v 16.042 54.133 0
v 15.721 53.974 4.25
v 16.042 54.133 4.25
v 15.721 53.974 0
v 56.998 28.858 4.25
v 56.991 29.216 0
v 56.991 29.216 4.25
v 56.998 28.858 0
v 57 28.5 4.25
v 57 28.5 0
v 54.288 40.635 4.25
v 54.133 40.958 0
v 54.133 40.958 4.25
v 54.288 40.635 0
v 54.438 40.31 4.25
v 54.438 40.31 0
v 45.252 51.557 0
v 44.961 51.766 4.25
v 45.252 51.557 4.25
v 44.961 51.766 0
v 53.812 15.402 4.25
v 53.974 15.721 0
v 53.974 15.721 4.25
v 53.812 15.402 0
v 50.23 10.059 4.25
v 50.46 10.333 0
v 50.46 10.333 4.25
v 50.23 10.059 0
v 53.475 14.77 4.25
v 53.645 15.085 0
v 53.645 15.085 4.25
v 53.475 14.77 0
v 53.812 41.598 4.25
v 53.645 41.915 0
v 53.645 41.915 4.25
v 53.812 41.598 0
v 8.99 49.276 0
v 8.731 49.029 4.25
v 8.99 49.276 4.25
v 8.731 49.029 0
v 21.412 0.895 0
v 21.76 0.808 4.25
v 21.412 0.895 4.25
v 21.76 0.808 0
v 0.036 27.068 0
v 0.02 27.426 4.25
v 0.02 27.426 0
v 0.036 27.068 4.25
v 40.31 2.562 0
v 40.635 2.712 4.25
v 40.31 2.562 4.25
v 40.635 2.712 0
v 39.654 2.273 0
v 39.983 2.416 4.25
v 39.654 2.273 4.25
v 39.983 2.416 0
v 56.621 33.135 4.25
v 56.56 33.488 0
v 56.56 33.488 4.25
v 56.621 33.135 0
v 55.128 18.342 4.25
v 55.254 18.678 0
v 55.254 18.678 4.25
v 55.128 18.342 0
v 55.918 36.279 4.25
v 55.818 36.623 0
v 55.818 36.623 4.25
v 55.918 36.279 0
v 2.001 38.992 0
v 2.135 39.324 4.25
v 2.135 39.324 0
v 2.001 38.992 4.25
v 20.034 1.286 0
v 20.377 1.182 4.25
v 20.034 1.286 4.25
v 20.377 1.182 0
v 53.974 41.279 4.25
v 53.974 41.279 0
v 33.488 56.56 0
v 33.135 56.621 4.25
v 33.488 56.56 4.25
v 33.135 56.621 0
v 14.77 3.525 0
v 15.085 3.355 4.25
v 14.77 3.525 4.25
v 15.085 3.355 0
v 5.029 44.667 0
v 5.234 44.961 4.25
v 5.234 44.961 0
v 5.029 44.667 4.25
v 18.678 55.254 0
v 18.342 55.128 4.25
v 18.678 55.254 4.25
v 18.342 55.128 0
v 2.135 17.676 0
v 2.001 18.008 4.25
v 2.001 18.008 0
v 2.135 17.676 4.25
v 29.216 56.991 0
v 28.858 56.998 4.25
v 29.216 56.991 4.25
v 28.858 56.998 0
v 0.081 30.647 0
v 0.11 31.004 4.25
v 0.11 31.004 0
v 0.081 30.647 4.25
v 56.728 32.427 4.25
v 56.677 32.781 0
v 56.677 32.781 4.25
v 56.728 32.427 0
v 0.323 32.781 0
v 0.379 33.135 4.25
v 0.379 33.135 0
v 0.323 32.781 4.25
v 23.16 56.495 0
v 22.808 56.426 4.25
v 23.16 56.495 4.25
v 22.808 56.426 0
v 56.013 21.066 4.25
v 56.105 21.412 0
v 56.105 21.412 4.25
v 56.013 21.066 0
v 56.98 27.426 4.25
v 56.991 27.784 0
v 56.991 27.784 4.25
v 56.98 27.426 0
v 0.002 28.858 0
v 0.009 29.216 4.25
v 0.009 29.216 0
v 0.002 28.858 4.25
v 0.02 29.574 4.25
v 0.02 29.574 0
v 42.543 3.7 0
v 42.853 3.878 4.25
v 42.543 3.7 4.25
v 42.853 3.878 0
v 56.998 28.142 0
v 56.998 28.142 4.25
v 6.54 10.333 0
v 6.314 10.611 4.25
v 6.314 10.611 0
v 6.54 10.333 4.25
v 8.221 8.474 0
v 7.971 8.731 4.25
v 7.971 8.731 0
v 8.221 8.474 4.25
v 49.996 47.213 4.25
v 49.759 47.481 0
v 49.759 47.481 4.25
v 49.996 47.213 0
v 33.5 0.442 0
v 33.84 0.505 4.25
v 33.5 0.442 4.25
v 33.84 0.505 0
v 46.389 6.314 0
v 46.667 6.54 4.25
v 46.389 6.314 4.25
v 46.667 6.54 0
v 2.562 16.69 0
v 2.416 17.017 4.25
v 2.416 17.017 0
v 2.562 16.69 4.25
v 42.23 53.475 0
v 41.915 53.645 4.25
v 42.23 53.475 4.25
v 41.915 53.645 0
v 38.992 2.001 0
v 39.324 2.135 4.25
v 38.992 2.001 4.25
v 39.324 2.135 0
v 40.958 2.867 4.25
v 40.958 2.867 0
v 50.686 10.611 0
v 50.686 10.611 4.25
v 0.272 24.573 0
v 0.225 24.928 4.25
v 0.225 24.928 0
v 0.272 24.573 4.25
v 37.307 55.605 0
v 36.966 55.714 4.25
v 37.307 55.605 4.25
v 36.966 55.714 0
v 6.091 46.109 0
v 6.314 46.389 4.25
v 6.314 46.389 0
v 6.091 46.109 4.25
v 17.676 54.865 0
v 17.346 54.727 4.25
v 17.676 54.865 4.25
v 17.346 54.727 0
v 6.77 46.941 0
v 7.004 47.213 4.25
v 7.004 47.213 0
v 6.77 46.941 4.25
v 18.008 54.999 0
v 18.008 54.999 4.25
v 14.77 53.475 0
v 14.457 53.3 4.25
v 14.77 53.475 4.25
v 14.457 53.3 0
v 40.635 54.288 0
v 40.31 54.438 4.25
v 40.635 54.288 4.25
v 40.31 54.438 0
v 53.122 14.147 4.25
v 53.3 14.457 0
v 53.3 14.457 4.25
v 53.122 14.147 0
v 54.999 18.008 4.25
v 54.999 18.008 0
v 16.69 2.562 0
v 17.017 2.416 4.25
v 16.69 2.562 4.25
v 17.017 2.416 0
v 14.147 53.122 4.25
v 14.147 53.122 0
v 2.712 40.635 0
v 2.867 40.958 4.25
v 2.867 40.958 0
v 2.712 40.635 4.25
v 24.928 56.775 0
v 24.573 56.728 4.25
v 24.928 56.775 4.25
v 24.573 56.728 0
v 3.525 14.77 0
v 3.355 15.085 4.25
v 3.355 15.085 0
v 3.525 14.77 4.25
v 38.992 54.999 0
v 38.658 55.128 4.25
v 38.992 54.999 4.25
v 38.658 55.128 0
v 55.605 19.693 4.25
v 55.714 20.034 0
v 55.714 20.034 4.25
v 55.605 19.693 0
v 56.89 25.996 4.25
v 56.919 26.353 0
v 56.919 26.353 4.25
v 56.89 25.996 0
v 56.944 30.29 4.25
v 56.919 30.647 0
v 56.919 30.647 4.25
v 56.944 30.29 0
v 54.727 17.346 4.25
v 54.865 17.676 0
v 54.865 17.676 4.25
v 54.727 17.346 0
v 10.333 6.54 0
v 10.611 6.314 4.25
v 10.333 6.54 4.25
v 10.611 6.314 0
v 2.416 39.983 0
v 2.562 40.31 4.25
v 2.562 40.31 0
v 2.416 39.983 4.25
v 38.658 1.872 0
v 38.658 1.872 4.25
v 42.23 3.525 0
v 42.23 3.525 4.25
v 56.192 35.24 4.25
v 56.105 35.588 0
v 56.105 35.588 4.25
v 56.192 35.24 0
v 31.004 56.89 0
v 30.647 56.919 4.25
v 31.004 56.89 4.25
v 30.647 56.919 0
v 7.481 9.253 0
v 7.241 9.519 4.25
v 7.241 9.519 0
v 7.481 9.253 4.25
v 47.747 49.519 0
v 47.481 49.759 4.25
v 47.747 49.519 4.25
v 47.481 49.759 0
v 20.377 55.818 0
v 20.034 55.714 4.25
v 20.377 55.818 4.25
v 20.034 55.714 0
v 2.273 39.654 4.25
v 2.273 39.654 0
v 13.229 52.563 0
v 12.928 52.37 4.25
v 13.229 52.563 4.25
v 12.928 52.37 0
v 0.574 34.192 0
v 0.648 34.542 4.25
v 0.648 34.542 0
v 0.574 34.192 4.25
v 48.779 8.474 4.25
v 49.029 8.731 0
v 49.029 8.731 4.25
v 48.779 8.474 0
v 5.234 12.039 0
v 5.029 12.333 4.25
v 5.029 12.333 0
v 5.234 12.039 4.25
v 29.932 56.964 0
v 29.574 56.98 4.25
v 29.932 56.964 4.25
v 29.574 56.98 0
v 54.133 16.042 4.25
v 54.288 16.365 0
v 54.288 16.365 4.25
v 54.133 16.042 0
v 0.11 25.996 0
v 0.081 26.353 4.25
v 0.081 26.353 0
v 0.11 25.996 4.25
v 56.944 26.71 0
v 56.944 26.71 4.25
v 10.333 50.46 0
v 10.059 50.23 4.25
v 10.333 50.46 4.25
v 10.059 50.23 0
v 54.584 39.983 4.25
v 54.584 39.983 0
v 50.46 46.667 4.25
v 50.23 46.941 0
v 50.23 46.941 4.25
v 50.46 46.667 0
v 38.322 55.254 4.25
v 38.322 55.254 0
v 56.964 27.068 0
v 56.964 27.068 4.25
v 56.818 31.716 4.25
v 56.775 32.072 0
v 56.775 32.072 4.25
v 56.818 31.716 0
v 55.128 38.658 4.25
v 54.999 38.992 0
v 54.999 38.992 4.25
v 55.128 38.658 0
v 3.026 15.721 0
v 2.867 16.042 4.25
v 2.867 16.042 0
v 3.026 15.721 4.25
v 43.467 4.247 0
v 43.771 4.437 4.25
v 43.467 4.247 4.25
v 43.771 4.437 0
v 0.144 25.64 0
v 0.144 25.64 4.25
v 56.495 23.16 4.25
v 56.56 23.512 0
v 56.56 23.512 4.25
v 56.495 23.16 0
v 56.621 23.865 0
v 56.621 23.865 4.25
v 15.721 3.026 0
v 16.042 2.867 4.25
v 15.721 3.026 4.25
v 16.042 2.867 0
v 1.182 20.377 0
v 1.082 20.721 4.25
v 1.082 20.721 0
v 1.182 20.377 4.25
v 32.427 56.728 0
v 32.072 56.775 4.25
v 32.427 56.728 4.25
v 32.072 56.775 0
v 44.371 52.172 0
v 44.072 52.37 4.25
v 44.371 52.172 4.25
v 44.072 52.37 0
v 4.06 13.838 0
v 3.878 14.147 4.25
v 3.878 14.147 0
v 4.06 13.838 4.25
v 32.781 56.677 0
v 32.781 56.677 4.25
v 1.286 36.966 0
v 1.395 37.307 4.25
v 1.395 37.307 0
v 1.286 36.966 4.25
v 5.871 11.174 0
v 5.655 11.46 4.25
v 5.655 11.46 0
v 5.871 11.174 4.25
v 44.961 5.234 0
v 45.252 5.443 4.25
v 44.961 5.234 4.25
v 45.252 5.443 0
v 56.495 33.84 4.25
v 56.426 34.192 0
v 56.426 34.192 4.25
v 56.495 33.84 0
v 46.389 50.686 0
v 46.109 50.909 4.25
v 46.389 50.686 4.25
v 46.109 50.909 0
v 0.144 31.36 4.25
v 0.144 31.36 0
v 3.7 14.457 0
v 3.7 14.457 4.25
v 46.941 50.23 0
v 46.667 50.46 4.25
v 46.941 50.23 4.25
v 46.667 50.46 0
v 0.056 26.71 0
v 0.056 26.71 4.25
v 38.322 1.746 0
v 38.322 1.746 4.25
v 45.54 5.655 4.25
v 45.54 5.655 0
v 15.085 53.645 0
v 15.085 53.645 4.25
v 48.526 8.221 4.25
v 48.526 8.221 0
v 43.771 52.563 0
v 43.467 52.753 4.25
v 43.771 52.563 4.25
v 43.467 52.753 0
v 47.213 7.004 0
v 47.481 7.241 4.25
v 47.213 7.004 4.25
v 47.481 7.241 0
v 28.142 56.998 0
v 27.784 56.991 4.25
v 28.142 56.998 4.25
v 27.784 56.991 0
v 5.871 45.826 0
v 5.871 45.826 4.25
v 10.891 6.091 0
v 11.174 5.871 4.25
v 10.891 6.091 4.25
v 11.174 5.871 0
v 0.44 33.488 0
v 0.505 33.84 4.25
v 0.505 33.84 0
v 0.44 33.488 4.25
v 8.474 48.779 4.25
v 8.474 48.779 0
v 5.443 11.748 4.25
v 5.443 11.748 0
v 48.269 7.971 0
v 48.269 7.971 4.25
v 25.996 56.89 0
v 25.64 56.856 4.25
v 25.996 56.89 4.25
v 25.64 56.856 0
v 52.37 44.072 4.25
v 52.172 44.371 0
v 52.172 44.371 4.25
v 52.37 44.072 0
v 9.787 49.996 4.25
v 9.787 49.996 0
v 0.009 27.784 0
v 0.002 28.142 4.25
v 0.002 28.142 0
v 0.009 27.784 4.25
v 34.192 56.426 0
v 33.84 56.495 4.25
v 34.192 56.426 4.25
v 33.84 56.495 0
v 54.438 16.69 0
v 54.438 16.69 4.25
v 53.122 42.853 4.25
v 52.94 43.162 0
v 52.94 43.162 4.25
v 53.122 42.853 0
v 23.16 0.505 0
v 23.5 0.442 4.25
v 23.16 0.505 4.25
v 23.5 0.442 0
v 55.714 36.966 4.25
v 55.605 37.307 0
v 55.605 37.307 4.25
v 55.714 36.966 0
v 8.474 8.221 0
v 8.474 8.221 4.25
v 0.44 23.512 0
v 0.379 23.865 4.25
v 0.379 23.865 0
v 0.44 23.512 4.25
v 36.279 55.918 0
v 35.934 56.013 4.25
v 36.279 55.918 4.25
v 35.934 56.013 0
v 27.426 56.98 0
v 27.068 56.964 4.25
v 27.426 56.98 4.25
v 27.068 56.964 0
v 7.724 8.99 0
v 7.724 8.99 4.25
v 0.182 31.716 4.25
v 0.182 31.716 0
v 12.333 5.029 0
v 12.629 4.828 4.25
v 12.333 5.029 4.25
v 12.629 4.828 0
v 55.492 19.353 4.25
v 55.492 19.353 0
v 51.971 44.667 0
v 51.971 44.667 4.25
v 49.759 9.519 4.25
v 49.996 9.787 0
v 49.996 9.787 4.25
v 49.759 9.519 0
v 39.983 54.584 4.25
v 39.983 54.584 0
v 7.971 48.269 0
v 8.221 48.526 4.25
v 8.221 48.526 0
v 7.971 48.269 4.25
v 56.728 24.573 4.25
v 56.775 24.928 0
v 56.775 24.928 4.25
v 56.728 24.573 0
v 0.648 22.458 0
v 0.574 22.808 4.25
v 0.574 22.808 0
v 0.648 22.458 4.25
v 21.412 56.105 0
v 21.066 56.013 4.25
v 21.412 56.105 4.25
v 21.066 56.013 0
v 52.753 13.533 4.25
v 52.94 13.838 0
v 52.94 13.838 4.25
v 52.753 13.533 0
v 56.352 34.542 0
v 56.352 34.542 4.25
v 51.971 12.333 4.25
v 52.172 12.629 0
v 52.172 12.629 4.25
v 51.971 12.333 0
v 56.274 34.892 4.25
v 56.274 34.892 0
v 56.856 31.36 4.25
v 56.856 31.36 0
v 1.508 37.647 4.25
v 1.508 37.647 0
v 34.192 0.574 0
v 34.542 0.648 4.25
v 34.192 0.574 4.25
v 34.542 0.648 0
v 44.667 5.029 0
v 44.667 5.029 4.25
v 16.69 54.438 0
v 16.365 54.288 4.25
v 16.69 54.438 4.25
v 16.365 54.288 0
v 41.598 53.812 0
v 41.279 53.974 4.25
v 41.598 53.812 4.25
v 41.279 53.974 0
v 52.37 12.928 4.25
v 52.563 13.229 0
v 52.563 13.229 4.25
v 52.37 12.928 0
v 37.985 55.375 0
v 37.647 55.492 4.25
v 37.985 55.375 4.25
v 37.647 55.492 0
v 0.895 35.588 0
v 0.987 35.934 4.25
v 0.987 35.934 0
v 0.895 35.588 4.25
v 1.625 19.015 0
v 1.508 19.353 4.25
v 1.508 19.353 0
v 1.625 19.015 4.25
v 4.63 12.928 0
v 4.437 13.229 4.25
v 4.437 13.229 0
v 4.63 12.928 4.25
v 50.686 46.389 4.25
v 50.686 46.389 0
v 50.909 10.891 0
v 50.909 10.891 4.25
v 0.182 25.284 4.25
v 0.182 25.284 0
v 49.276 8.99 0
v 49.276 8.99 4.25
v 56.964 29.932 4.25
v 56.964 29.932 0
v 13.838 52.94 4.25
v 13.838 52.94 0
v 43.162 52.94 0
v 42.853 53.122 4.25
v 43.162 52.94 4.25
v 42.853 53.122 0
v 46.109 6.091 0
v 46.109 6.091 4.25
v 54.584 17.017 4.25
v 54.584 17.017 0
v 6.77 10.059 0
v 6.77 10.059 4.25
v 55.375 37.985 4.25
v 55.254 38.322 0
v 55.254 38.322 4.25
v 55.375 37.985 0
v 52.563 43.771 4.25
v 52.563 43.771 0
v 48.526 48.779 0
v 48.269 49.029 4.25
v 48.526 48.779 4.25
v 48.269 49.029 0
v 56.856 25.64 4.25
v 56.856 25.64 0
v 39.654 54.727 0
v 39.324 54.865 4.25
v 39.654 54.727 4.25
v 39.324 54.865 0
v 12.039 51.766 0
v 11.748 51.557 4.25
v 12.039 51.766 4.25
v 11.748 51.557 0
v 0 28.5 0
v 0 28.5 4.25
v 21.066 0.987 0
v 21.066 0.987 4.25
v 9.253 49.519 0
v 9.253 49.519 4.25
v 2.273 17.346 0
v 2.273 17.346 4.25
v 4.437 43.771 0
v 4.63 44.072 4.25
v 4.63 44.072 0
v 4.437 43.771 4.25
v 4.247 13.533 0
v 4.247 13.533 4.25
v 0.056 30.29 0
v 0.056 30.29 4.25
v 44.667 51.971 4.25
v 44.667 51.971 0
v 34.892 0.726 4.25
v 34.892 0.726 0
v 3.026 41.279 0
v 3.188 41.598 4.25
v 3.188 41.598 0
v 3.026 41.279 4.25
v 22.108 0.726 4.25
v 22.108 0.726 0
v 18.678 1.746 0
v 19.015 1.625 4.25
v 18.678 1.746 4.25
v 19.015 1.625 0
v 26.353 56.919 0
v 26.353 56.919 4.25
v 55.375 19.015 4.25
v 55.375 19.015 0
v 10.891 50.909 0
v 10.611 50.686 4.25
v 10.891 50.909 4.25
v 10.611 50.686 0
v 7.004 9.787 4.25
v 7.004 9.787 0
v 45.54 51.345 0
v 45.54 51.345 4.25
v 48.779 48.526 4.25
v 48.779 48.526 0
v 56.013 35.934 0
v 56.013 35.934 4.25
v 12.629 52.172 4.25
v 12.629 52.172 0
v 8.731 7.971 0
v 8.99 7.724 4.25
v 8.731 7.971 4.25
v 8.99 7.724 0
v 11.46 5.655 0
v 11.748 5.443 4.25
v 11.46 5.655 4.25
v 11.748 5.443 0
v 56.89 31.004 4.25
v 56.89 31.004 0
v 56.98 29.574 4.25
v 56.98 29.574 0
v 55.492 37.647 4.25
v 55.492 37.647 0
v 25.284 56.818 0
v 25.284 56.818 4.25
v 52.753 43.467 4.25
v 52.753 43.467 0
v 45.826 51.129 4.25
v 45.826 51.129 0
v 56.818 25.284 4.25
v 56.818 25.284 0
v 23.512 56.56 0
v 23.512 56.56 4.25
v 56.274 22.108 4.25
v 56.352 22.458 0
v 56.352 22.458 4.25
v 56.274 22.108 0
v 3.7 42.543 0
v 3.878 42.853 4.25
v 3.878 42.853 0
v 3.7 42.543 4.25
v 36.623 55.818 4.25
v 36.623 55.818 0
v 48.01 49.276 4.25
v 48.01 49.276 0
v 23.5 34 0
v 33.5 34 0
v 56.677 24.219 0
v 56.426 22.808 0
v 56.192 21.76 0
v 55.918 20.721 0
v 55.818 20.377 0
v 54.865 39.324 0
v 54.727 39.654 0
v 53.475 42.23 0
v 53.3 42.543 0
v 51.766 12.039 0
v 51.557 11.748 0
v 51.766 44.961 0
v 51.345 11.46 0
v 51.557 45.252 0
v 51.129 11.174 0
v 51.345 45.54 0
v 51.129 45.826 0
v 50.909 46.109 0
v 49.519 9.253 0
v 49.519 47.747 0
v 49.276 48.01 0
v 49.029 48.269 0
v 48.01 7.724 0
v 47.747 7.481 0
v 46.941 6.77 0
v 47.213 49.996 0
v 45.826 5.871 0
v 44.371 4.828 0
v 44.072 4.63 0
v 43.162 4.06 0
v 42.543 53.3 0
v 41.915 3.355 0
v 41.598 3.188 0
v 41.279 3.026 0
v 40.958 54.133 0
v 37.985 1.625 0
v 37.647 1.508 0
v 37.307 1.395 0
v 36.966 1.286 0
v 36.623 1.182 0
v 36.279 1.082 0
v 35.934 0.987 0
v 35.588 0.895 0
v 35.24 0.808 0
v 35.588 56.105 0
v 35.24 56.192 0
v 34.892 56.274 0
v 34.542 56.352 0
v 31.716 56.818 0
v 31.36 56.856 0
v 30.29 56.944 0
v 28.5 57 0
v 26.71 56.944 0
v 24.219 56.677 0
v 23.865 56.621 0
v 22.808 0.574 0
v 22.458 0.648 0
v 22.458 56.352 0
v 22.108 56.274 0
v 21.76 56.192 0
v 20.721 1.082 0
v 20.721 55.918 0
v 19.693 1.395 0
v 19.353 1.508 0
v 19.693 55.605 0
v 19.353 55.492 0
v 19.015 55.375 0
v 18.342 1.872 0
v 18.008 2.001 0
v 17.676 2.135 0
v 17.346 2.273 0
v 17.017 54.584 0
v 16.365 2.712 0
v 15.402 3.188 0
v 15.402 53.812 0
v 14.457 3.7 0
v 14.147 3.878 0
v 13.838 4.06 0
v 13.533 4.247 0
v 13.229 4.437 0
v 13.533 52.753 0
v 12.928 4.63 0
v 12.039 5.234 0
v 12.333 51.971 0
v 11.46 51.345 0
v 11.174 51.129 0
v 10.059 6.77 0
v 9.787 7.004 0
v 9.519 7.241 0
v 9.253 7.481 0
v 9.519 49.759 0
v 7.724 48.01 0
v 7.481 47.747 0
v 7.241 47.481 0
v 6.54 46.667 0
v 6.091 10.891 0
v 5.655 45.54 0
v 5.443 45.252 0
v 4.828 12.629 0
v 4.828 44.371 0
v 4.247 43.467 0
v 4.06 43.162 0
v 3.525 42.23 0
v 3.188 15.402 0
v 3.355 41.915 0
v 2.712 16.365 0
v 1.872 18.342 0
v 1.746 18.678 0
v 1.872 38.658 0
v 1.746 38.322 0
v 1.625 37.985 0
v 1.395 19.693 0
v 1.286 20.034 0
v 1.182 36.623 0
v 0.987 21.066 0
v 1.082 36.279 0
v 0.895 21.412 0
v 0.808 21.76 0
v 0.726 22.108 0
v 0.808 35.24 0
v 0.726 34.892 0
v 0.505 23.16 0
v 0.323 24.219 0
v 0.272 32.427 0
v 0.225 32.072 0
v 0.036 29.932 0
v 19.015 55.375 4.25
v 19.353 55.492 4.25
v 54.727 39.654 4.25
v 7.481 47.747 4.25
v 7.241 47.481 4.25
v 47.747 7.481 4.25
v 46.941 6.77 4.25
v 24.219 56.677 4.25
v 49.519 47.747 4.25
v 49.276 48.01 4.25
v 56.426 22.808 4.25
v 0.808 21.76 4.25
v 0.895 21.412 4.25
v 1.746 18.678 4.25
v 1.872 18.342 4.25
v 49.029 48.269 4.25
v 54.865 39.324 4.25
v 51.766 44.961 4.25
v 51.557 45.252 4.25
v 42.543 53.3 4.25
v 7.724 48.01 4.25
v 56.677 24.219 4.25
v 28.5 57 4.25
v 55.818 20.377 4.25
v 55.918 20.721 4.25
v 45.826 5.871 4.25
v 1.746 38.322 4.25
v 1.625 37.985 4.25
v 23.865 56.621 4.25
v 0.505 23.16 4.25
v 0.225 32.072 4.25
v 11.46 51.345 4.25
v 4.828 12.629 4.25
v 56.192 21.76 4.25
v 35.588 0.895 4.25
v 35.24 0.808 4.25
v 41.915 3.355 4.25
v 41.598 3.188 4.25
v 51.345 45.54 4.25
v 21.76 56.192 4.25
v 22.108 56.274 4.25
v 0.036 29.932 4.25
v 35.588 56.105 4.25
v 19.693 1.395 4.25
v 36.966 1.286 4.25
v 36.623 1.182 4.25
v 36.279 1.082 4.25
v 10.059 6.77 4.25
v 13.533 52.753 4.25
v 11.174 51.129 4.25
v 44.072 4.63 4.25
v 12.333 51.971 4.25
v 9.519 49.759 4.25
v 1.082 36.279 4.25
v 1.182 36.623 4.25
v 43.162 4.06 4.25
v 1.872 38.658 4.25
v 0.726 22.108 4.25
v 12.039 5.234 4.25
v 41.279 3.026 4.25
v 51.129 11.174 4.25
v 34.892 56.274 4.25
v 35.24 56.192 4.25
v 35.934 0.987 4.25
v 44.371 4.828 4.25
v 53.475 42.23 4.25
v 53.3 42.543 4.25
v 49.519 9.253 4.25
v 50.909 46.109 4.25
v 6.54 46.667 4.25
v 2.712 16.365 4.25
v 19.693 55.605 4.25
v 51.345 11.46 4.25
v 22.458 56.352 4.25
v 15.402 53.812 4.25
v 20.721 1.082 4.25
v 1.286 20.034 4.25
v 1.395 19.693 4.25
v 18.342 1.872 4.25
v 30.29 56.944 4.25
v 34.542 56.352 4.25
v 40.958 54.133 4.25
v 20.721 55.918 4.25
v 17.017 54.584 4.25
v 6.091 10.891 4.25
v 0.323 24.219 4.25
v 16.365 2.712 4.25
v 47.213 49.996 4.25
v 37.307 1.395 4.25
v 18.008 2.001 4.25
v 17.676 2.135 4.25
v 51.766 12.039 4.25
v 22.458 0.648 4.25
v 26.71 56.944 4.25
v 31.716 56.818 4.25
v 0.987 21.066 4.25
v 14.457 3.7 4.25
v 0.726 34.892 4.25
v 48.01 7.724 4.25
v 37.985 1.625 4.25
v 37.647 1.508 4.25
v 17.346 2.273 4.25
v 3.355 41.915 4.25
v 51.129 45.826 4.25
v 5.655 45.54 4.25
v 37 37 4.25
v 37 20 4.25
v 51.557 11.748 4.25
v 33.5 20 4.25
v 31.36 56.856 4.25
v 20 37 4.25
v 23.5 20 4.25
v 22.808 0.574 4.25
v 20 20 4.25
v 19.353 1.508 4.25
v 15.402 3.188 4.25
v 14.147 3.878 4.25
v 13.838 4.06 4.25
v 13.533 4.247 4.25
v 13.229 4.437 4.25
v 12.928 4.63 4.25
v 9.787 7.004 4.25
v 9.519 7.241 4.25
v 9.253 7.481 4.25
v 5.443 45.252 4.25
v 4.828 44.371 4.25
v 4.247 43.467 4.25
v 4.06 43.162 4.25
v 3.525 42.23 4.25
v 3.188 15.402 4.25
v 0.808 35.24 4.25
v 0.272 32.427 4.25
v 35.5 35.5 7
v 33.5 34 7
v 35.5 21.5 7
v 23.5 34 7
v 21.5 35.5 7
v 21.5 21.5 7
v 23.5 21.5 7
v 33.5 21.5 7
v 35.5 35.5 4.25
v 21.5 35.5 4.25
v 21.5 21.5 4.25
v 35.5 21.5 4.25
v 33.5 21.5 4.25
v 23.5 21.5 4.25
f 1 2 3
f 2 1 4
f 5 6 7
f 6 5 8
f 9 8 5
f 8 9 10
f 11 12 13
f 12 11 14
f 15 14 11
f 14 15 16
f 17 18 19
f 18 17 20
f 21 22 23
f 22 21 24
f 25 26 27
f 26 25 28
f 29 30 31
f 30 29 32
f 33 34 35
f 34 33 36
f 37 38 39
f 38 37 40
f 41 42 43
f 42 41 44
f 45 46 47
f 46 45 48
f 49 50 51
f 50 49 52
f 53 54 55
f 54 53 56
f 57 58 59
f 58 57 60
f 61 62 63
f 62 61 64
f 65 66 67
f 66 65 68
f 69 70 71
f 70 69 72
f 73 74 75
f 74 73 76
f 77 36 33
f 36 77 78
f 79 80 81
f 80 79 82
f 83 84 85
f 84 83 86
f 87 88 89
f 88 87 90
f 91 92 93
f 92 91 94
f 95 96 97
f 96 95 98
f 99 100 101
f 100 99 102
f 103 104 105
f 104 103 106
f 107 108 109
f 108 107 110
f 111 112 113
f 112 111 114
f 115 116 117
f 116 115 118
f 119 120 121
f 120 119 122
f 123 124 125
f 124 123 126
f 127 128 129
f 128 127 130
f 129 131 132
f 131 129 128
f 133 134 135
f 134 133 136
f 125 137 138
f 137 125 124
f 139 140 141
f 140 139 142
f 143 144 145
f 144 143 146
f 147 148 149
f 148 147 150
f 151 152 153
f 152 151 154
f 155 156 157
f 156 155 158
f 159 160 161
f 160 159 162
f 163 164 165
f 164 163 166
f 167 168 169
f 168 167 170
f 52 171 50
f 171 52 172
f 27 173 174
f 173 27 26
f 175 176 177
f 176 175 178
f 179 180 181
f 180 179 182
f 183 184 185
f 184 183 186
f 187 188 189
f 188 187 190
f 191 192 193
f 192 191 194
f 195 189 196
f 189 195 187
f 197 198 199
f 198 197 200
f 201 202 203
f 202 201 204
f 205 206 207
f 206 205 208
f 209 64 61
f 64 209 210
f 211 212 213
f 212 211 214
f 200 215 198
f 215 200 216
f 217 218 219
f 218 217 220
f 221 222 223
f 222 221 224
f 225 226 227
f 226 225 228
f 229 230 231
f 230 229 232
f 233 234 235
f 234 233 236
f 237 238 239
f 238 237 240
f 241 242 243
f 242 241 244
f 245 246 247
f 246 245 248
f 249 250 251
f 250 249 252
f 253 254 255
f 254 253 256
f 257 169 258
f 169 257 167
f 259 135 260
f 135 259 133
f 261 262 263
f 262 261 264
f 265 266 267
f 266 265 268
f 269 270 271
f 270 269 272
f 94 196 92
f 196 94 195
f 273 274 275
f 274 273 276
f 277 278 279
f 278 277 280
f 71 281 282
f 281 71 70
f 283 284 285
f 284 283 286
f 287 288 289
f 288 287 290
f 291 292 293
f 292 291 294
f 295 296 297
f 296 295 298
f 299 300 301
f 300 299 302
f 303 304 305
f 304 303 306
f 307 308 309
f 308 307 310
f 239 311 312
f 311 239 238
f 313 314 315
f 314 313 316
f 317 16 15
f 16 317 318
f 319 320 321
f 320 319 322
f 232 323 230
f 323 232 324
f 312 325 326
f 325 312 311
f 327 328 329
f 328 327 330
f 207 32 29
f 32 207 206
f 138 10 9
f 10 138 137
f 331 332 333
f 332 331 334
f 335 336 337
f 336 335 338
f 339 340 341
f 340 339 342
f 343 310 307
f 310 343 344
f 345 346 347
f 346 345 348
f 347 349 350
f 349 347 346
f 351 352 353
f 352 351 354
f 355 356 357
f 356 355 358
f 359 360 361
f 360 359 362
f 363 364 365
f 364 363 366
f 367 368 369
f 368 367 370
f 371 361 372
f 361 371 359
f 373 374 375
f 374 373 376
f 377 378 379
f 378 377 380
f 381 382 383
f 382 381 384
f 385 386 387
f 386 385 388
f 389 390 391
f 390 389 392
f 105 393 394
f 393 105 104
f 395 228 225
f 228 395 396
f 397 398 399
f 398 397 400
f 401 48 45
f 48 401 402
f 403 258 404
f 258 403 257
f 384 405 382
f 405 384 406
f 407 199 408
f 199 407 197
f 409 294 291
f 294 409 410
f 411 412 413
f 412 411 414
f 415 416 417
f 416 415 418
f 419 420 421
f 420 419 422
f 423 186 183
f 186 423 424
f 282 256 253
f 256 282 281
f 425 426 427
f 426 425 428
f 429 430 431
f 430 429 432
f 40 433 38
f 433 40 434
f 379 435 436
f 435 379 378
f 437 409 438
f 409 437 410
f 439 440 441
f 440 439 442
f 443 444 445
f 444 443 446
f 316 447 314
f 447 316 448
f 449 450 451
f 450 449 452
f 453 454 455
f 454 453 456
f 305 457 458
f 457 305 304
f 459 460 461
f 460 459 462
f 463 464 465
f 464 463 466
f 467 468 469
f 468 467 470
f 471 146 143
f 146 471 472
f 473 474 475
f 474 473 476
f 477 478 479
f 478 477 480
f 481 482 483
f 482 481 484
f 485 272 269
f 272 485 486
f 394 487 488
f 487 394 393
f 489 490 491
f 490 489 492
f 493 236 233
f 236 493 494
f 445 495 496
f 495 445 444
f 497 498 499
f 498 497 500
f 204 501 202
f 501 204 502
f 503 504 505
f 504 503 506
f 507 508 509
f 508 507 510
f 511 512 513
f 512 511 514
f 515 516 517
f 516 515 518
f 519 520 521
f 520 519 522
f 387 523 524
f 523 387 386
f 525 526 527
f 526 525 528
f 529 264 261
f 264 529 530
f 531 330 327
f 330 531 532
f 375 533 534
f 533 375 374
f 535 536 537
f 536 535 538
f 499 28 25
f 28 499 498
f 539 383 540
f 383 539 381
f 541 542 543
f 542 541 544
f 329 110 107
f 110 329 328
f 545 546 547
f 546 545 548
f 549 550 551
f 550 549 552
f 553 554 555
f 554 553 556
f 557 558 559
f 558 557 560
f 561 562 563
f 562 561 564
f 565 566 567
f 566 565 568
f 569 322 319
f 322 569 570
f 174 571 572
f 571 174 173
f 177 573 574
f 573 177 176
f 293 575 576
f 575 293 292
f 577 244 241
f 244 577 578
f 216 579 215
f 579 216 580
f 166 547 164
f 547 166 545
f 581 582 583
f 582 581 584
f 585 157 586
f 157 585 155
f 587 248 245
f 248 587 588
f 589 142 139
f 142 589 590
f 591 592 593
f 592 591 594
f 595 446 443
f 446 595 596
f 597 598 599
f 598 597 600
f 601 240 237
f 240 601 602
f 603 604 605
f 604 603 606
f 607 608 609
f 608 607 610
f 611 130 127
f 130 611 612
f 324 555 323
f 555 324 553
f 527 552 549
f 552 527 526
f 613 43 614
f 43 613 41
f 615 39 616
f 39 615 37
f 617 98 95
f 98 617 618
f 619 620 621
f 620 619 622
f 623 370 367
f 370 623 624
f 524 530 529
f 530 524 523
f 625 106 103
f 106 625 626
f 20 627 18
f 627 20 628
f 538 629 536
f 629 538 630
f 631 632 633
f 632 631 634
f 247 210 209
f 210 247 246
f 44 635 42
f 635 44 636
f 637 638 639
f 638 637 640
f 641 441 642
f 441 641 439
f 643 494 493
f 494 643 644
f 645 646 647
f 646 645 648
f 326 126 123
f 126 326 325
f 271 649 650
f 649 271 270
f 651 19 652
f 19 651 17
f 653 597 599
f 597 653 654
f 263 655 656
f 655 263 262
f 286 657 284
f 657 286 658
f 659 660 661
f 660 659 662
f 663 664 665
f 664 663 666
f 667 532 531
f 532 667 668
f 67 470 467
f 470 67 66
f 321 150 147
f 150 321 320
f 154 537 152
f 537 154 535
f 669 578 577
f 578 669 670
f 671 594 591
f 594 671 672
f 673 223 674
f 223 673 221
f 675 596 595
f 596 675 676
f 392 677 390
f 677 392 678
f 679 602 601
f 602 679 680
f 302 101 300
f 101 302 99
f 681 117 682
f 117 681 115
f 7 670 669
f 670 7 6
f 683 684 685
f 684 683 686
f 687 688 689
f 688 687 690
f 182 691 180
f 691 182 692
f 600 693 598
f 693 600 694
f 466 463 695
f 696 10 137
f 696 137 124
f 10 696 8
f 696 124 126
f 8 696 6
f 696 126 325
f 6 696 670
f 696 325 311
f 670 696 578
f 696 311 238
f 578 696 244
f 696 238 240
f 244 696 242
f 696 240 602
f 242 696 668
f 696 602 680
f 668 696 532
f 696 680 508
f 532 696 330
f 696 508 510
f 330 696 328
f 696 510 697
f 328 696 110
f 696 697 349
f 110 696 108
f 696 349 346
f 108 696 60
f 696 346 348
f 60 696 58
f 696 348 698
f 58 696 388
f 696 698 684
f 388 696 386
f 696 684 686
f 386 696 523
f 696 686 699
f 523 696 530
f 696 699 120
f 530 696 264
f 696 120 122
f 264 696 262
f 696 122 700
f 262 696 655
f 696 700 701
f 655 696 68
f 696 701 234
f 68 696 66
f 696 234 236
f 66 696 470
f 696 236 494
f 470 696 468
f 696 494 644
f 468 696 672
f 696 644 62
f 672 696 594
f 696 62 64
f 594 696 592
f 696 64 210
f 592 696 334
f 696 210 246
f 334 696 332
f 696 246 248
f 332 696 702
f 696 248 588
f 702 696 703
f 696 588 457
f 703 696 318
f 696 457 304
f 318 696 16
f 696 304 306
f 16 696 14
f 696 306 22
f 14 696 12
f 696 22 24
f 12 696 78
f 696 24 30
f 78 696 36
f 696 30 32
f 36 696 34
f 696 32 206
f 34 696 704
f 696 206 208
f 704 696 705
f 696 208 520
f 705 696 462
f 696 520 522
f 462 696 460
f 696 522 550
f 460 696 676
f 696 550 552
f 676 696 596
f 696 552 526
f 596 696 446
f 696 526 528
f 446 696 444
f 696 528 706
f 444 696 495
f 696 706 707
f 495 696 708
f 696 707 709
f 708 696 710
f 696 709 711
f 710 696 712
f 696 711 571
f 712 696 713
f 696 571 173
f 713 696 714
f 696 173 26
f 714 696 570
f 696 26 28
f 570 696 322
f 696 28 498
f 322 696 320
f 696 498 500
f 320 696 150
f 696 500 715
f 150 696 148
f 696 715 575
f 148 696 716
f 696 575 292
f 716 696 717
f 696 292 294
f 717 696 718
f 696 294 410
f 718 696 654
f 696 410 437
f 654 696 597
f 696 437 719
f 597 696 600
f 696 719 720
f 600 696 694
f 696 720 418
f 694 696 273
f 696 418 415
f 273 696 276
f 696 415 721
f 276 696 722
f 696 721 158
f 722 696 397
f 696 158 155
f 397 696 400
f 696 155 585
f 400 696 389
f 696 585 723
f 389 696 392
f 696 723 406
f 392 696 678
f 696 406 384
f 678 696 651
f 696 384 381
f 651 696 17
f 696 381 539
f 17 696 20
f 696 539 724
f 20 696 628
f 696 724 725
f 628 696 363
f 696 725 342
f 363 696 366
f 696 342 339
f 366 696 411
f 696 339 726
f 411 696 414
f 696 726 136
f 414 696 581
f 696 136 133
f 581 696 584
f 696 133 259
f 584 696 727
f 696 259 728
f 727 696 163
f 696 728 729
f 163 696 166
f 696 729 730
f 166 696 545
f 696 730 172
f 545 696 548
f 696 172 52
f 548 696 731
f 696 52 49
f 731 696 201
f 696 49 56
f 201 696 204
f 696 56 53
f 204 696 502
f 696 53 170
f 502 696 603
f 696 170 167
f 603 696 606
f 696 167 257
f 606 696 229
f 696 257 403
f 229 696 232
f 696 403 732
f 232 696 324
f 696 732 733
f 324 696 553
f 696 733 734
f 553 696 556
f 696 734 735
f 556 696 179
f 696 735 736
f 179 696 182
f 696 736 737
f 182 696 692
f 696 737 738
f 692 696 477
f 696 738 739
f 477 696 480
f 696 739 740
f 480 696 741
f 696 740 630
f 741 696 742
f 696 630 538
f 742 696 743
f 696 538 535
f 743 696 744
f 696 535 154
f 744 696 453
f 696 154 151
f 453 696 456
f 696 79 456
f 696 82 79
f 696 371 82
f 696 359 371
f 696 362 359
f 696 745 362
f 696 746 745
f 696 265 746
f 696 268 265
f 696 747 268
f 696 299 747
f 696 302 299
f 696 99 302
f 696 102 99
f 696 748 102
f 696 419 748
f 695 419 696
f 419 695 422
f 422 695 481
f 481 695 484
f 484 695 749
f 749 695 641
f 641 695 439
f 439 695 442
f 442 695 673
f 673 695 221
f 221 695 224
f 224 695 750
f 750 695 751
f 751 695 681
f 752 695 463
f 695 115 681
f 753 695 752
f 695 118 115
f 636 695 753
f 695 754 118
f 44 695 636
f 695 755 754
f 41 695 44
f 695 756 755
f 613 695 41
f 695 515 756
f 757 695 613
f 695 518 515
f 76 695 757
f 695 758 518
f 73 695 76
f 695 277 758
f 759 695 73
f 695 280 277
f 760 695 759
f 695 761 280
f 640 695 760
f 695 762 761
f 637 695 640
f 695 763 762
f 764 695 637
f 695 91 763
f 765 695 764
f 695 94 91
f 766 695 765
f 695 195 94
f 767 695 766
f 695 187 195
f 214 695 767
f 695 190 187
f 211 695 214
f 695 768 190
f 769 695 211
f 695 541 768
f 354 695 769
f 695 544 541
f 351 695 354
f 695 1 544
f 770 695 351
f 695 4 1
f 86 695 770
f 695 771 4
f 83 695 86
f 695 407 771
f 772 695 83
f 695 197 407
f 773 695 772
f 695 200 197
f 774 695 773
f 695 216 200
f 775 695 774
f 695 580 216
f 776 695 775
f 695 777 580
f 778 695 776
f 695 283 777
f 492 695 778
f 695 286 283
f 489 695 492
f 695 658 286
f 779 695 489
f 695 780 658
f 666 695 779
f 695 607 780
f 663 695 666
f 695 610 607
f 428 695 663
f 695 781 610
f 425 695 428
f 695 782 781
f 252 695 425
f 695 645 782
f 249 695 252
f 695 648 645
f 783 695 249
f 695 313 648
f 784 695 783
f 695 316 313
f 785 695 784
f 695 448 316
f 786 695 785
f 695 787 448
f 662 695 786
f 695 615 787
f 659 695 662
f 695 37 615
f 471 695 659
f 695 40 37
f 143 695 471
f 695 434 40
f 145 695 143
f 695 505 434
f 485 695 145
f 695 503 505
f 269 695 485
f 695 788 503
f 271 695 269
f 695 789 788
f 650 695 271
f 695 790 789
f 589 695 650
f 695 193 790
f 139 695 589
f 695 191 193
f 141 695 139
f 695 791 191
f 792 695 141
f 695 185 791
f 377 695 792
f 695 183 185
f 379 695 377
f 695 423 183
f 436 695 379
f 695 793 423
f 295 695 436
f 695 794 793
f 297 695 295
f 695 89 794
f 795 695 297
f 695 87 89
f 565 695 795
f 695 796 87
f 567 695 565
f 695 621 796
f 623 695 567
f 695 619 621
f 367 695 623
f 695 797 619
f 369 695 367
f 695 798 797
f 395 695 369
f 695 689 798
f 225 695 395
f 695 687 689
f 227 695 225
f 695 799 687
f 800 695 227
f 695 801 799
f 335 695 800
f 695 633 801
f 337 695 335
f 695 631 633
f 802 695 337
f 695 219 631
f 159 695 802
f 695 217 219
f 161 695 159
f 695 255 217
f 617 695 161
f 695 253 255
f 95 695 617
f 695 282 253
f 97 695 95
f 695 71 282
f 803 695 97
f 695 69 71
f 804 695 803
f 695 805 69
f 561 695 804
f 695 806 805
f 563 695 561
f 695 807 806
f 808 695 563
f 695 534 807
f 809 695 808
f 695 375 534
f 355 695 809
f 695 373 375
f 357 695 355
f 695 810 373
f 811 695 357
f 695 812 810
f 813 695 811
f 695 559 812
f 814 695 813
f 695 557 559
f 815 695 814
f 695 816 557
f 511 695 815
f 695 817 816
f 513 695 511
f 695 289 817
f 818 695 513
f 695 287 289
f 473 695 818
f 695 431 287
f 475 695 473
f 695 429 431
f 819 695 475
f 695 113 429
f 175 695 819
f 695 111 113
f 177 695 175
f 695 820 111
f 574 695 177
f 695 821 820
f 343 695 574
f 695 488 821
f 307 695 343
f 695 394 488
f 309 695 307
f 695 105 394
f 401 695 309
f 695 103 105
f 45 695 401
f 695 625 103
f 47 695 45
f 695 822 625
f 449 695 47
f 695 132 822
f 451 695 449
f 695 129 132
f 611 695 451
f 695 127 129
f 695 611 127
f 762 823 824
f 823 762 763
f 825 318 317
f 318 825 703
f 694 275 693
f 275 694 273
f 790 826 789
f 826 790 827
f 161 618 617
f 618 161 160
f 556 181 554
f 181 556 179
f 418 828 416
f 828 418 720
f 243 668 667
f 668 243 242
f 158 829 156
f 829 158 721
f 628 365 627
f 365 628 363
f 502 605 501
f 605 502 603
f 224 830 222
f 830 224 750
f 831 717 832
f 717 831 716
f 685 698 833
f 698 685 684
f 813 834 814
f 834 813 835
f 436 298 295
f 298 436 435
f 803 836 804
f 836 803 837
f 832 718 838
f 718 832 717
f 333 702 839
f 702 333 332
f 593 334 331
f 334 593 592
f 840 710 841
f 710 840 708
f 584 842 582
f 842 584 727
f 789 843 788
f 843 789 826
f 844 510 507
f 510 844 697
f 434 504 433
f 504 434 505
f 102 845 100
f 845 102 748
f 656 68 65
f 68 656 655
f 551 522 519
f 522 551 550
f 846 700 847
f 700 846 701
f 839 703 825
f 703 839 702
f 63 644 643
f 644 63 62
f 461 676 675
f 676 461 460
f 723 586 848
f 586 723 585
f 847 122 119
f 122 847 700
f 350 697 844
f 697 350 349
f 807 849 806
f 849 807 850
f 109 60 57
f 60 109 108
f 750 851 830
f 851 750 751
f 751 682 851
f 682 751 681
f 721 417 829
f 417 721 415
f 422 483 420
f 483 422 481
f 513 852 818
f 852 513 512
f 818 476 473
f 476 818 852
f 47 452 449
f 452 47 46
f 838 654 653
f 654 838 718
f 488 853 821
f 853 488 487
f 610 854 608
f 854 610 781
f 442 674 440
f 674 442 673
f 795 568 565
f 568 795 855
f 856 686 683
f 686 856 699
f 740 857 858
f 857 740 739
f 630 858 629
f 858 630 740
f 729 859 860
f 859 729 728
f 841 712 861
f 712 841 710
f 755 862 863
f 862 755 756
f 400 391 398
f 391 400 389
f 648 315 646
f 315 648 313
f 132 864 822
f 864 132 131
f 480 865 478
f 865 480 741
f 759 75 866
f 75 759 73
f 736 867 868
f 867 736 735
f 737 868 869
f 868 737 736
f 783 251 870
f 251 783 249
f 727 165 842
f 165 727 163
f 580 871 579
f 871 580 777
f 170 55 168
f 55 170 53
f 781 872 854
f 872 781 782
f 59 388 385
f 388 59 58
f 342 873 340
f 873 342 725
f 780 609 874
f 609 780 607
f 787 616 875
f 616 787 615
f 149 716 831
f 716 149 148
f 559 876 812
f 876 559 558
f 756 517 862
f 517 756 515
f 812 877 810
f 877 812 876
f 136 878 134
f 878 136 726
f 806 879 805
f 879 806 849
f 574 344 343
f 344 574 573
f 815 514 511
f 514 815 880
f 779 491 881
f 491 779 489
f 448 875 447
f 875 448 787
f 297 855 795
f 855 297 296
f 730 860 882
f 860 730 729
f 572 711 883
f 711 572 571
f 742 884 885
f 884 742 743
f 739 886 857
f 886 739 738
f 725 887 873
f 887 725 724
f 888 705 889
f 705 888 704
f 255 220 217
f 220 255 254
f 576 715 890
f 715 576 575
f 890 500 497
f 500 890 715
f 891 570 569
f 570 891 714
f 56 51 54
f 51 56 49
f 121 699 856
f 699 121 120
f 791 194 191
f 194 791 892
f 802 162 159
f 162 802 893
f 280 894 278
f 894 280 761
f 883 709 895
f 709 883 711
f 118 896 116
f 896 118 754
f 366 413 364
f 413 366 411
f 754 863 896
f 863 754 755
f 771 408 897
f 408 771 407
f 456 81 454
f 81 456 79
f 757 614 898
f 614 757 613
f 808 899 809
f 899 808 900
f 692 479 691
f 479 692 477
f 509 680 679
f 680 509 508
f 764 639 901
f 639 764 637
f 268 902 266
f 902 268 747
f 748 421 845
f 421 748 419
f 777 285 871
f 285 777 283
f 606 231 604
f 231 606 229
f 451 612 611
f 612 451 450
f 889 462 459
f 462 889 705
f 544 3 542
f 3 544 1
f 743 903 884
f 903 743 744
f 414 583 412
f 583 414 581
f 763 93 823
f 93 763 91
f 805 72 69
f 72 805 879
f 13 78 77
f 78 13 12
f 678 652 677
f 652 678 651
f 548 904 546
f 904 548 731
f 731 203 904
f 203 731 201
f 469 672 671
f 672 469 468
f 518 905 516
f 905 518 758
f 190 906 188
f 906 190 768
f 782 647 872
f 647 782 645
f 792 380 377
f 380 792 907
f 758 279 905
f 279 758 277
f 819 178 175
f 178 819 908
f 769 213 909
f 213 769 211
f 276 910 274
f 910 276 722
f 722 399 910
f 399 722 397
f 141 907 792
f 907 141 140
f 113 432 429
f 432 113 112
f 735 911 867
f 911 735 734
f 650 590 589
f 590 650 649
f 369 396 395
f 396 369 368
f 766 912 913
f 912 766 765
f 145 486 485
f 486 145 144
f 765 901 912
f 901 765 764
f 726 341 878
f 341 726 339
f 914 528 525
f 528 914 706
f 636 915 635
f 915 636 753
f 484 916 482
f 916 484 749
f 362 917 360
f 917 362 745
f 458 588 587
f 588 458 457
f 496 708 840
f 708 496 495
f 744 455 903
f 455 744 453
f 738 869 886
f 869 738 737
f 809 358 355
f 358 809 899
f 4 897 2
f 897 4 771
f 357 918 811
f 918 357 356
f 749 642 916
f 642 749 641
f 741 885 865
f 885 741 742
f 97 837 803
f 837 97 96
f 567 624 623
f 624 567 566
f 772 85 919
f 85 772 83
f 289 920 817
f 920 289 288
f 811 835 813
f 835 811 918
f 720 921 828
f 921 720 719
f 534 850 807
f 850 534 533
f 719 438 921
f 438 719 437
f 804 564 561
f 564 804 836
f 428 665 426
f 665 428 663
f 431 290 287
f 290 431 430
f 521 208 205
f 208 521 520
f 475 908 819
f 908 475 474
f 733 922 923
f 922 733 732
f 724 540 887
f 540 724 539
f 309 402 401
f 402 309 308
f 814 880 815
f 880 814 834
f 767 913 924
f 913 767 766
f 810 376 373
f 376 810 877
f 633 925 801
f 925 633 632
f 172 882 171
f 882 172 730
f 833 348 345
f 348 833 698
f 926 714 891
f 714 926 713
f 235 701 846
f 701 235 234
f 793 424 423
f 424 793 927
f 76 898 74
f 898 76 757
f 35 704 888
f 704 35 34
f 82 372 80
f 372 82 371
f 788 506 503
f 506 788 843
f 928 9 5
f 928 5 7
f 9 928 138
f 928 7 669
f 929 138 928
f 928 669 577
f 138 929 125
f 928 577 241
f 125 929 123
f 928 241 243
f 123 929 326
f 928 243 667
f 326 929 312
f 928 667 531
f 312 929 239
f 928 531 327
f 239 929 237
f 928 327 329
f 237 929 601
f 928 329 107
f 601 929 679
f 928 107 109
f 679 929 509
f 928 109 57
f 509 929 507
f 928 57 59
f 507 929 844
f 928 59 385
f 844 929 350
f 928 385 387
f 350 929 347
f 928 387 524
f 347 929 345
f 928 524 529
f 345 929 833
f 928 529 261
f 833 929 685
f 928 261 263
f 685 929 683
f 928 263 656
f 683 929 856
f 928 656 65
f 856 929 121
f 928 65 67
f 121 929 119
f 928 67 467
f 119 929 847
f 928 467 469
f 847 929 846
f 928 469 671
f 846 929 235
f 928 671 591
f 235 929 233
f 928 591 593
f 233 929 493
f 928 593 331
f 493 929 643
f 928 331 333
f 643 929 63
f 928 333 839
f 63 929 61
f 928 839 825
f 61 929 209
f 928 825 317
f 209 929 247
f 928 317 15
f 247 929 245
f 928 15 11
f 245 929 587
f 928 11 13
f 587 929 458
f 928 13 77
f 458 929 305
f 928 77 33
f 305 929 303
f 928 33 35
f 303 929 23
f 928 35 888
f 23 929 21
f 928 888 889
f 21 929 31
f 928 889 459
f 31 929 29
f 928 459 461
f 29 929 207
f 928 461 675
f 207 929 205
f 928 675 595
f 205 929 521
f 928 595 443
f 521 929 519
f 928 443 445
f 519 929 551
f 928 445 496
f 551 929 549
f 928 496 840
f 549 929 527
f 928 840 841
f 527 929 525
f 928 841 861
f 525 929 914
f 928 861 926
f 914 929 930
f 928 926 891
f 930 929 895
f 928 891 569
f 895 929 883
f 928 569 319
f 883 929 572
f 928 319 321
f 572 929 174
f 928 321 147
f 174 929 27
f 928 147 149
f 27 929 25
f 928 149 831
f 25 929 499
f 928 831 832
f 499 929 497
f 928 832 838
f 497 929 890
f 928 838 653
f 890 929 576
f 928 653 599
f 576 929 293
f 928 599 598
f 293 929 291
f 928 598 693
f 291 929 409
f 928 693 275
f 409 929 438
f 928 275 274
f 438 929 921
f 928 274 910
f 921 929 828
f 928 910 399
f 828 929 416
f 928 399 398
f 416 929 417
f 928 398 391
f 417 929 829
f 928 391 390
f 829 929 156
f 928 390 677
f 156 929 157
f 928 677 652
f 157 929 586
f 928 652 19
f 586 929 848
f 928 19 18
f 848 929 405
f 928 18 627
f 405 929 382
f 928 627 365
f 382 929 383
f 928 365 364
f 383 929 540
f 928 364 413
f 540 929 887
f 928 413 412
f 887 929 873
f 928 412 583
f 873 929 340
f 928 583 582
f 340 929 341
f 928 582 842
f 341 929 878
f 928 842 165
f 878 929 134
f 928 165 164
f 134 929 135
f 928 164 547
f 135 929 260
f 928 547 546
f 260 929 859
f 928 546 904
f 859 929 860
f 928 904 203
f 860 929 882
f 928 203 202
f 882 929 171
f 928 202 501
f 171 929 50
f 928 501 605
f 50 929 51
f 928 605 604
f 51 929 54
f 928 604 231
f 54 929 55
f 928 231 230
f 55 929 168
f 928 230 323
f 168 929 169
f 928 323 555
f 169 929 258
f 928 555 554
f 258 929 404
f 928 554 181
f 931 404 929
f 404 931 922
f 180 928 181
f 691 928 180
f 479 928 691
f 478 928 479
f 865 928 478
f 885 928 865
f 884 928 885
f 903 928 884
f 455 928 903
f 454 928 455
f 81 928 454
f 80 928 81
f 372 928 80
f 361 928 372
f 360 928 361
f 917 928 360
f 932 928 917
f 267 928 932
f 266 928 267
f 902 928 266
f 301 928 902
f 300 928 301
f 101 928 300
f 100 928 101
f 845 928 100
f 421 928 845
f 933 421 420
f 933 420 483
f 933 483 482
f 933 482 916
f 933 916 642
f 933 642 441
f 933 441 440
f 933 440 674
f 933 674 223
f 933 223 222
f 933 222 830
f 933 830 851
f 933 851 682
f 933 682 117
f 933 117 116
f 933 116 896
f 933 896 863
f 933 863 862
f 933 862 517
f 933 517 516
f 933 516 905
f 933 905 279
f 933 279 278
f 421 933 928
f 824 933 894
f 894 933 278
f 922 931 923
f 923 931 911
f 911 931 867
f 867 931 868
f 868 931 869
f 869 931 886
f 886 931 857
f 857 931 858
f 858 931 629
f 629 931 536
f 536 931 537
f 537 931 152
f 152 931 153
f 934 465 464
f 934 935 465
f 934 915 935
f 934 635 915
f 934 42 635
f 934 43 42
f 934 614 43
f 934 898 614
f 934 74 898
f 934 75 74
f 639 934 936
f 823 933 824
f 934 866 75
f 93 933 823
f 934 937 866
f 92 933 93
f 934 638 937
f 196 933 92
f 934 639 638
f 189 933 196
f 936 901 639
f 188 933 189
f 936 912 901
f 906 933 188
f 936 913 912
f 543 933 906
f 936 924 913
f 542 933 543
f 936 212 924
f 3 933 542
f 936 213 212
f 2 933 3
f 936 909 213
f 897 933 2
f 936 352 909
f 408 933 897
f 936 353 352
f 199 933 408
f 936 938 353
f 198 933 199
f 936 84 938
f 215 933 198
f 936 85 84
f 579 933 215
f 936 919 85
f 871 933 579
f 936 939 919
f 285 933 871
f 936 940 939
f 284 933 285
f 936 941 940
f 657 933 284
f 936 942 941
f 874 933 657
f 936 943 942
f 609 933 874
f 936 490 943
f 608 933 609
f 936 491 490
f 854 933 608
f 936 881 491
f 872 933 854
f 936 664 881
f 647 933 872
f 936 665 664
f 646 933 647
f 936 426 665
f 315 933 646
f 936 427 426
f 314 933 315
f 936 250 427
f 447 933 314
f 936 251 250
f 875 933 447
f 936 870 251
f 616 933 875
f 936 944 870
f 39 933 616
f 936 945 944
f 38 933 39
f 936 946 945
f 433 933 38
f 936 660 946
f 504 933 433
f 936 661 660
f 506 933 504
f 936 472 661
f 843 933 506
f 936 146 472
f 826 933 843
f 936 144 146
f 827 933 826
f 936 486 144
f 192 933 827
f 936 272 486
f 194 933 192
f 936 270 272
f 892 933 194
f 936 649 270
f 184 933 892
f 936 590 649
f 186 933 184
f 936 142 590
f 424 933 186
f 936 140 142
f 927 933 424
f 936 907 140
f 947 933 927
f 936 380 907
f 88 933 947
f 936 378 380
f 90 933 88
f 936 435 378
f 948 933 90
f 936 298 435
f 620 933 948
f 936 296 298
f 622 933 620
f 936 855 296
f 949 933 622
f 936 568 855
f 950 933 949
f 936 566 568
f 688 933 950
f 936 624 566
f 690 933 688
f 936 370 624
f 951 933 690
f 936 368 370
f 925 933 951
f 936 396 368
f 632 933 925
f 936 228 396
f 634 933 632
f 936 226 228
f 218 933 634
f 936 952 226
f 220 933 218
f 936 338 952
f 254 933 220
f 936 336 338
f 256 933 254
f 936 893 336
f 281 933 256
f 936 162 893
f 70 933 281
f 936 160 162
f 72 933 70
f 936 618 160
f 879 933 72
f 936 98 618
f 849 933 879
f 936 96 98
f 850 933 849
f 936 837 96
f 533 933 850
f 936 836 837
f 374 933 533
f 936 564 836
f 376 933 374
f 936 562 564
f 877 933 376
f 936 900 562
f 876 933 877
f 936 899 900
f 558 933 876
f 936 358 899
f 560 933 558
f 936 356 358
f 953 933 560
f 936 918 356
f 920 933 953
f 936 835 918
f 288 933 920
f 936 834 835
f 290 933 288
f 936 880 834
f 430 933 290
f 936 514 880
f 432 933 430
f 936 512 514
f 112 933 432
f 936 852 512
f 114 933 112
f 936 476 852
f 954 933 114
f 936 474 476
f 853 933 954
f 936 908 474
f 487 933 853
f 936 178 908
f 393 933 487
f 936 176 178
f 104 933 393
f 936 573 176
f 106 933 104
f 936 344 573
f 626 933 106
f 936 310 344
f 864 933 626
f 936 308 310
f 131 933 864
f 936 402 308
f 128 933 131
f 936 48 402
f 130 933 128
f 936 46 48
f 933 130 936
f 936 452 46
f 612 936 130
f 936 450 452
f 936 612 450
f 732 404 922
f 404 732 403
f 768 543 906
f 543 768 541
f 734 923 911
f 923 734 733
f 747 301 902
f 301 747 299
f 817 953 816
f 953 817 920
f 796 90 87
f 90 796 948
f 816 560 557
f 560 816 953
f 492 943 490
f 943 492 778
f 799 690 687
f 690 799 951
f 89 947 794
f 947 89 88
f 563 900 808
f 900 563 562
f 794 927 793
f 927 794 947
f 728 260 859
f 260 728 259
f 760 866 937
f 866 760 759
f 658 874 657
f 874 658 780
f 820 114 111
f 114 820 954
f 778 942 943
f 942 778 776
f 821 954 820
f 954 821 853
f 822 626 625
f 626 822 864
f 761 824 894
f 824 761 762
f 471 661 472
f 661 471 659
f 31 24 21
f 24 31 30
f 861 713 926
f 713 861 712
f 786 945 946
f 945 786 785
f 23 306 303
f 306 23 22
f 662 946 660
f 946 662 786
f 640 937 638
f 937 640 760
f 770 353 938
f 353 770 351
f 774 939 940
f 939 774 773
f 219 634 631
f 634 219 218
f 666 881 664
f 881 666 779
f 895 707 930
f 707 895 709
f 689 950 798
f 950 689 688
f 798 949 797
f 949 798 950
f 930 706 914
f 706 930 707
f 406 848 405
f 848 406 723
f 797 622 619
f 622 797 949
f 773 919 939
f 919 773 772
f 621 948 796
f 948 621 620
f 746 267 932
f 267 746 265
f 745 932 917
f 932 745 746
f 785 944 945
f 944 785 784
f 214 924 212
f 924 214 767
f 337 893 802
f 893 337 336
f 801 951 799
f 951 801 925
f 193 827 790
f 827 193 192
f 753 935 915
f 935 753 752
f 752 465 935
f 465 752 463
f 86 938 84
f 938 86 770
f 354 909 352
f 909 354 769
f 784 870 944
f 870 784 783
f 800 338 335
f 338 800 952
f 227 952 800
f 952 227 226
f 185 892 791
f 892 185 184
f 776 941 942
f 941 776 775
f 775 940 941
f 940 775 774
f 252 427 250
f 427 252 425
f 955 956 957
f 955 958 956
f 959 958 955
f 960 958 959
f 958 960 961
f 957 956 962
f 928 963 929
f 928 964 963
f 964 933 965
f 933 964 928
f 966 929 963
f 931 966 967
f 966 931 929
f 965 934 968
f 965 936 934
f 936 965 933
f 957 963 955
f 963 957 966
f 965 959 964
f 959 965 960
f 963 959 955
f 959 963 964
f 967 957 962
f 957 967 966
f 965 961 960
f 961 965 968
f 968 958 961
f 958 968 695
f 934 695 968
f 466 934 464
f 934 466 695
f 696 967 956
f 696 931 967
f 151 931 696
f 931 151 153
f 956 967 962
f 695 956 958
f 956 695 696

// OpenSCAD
$fn=500;
width=17;
outerWidth=57;
wallWidth=2;
tabWidth=2;
hd=0.5; // holder distance

module centerCube()
{
	hull()
	{
		translate([2.25,2.25,0]) cube([10,10,1]);
	}
	
}


module mainCube()
{
	diff = outerWidth - width;
	offset = diff/2;
	innerWidth = width - (wallWidth*2);
	
	difference()
	{
		union()
		{
			translate([outerWidth/2,outerWidth/2,0]) cylinder(d=outerWidth,4.25);
			color("blue") translate([offset,offset,0]) cube([width,width,7]);
		}
		
		
		translate([offset+1.25,offset+1.25,0]) centerCube();
		//translate([offset-wallWidth,offset+(wallWidth),6]) rotate([0,0,-45]) cube([wallWidth*3,wallWidth*5,15]);
		translate([offset,offset,4.25]) difference()
		{
		cube([width,width,3]);
		translate([wallWidth-0.5, wallWidth-0.5,0]) cube([width-(wallWidth*2)+1,width-(wallWidth*2)+1,3]);
		}
		translate([(outerWidth/2)-5,0,0]) cube([10,34,8]);
		
	}
	
}

mainCube();
